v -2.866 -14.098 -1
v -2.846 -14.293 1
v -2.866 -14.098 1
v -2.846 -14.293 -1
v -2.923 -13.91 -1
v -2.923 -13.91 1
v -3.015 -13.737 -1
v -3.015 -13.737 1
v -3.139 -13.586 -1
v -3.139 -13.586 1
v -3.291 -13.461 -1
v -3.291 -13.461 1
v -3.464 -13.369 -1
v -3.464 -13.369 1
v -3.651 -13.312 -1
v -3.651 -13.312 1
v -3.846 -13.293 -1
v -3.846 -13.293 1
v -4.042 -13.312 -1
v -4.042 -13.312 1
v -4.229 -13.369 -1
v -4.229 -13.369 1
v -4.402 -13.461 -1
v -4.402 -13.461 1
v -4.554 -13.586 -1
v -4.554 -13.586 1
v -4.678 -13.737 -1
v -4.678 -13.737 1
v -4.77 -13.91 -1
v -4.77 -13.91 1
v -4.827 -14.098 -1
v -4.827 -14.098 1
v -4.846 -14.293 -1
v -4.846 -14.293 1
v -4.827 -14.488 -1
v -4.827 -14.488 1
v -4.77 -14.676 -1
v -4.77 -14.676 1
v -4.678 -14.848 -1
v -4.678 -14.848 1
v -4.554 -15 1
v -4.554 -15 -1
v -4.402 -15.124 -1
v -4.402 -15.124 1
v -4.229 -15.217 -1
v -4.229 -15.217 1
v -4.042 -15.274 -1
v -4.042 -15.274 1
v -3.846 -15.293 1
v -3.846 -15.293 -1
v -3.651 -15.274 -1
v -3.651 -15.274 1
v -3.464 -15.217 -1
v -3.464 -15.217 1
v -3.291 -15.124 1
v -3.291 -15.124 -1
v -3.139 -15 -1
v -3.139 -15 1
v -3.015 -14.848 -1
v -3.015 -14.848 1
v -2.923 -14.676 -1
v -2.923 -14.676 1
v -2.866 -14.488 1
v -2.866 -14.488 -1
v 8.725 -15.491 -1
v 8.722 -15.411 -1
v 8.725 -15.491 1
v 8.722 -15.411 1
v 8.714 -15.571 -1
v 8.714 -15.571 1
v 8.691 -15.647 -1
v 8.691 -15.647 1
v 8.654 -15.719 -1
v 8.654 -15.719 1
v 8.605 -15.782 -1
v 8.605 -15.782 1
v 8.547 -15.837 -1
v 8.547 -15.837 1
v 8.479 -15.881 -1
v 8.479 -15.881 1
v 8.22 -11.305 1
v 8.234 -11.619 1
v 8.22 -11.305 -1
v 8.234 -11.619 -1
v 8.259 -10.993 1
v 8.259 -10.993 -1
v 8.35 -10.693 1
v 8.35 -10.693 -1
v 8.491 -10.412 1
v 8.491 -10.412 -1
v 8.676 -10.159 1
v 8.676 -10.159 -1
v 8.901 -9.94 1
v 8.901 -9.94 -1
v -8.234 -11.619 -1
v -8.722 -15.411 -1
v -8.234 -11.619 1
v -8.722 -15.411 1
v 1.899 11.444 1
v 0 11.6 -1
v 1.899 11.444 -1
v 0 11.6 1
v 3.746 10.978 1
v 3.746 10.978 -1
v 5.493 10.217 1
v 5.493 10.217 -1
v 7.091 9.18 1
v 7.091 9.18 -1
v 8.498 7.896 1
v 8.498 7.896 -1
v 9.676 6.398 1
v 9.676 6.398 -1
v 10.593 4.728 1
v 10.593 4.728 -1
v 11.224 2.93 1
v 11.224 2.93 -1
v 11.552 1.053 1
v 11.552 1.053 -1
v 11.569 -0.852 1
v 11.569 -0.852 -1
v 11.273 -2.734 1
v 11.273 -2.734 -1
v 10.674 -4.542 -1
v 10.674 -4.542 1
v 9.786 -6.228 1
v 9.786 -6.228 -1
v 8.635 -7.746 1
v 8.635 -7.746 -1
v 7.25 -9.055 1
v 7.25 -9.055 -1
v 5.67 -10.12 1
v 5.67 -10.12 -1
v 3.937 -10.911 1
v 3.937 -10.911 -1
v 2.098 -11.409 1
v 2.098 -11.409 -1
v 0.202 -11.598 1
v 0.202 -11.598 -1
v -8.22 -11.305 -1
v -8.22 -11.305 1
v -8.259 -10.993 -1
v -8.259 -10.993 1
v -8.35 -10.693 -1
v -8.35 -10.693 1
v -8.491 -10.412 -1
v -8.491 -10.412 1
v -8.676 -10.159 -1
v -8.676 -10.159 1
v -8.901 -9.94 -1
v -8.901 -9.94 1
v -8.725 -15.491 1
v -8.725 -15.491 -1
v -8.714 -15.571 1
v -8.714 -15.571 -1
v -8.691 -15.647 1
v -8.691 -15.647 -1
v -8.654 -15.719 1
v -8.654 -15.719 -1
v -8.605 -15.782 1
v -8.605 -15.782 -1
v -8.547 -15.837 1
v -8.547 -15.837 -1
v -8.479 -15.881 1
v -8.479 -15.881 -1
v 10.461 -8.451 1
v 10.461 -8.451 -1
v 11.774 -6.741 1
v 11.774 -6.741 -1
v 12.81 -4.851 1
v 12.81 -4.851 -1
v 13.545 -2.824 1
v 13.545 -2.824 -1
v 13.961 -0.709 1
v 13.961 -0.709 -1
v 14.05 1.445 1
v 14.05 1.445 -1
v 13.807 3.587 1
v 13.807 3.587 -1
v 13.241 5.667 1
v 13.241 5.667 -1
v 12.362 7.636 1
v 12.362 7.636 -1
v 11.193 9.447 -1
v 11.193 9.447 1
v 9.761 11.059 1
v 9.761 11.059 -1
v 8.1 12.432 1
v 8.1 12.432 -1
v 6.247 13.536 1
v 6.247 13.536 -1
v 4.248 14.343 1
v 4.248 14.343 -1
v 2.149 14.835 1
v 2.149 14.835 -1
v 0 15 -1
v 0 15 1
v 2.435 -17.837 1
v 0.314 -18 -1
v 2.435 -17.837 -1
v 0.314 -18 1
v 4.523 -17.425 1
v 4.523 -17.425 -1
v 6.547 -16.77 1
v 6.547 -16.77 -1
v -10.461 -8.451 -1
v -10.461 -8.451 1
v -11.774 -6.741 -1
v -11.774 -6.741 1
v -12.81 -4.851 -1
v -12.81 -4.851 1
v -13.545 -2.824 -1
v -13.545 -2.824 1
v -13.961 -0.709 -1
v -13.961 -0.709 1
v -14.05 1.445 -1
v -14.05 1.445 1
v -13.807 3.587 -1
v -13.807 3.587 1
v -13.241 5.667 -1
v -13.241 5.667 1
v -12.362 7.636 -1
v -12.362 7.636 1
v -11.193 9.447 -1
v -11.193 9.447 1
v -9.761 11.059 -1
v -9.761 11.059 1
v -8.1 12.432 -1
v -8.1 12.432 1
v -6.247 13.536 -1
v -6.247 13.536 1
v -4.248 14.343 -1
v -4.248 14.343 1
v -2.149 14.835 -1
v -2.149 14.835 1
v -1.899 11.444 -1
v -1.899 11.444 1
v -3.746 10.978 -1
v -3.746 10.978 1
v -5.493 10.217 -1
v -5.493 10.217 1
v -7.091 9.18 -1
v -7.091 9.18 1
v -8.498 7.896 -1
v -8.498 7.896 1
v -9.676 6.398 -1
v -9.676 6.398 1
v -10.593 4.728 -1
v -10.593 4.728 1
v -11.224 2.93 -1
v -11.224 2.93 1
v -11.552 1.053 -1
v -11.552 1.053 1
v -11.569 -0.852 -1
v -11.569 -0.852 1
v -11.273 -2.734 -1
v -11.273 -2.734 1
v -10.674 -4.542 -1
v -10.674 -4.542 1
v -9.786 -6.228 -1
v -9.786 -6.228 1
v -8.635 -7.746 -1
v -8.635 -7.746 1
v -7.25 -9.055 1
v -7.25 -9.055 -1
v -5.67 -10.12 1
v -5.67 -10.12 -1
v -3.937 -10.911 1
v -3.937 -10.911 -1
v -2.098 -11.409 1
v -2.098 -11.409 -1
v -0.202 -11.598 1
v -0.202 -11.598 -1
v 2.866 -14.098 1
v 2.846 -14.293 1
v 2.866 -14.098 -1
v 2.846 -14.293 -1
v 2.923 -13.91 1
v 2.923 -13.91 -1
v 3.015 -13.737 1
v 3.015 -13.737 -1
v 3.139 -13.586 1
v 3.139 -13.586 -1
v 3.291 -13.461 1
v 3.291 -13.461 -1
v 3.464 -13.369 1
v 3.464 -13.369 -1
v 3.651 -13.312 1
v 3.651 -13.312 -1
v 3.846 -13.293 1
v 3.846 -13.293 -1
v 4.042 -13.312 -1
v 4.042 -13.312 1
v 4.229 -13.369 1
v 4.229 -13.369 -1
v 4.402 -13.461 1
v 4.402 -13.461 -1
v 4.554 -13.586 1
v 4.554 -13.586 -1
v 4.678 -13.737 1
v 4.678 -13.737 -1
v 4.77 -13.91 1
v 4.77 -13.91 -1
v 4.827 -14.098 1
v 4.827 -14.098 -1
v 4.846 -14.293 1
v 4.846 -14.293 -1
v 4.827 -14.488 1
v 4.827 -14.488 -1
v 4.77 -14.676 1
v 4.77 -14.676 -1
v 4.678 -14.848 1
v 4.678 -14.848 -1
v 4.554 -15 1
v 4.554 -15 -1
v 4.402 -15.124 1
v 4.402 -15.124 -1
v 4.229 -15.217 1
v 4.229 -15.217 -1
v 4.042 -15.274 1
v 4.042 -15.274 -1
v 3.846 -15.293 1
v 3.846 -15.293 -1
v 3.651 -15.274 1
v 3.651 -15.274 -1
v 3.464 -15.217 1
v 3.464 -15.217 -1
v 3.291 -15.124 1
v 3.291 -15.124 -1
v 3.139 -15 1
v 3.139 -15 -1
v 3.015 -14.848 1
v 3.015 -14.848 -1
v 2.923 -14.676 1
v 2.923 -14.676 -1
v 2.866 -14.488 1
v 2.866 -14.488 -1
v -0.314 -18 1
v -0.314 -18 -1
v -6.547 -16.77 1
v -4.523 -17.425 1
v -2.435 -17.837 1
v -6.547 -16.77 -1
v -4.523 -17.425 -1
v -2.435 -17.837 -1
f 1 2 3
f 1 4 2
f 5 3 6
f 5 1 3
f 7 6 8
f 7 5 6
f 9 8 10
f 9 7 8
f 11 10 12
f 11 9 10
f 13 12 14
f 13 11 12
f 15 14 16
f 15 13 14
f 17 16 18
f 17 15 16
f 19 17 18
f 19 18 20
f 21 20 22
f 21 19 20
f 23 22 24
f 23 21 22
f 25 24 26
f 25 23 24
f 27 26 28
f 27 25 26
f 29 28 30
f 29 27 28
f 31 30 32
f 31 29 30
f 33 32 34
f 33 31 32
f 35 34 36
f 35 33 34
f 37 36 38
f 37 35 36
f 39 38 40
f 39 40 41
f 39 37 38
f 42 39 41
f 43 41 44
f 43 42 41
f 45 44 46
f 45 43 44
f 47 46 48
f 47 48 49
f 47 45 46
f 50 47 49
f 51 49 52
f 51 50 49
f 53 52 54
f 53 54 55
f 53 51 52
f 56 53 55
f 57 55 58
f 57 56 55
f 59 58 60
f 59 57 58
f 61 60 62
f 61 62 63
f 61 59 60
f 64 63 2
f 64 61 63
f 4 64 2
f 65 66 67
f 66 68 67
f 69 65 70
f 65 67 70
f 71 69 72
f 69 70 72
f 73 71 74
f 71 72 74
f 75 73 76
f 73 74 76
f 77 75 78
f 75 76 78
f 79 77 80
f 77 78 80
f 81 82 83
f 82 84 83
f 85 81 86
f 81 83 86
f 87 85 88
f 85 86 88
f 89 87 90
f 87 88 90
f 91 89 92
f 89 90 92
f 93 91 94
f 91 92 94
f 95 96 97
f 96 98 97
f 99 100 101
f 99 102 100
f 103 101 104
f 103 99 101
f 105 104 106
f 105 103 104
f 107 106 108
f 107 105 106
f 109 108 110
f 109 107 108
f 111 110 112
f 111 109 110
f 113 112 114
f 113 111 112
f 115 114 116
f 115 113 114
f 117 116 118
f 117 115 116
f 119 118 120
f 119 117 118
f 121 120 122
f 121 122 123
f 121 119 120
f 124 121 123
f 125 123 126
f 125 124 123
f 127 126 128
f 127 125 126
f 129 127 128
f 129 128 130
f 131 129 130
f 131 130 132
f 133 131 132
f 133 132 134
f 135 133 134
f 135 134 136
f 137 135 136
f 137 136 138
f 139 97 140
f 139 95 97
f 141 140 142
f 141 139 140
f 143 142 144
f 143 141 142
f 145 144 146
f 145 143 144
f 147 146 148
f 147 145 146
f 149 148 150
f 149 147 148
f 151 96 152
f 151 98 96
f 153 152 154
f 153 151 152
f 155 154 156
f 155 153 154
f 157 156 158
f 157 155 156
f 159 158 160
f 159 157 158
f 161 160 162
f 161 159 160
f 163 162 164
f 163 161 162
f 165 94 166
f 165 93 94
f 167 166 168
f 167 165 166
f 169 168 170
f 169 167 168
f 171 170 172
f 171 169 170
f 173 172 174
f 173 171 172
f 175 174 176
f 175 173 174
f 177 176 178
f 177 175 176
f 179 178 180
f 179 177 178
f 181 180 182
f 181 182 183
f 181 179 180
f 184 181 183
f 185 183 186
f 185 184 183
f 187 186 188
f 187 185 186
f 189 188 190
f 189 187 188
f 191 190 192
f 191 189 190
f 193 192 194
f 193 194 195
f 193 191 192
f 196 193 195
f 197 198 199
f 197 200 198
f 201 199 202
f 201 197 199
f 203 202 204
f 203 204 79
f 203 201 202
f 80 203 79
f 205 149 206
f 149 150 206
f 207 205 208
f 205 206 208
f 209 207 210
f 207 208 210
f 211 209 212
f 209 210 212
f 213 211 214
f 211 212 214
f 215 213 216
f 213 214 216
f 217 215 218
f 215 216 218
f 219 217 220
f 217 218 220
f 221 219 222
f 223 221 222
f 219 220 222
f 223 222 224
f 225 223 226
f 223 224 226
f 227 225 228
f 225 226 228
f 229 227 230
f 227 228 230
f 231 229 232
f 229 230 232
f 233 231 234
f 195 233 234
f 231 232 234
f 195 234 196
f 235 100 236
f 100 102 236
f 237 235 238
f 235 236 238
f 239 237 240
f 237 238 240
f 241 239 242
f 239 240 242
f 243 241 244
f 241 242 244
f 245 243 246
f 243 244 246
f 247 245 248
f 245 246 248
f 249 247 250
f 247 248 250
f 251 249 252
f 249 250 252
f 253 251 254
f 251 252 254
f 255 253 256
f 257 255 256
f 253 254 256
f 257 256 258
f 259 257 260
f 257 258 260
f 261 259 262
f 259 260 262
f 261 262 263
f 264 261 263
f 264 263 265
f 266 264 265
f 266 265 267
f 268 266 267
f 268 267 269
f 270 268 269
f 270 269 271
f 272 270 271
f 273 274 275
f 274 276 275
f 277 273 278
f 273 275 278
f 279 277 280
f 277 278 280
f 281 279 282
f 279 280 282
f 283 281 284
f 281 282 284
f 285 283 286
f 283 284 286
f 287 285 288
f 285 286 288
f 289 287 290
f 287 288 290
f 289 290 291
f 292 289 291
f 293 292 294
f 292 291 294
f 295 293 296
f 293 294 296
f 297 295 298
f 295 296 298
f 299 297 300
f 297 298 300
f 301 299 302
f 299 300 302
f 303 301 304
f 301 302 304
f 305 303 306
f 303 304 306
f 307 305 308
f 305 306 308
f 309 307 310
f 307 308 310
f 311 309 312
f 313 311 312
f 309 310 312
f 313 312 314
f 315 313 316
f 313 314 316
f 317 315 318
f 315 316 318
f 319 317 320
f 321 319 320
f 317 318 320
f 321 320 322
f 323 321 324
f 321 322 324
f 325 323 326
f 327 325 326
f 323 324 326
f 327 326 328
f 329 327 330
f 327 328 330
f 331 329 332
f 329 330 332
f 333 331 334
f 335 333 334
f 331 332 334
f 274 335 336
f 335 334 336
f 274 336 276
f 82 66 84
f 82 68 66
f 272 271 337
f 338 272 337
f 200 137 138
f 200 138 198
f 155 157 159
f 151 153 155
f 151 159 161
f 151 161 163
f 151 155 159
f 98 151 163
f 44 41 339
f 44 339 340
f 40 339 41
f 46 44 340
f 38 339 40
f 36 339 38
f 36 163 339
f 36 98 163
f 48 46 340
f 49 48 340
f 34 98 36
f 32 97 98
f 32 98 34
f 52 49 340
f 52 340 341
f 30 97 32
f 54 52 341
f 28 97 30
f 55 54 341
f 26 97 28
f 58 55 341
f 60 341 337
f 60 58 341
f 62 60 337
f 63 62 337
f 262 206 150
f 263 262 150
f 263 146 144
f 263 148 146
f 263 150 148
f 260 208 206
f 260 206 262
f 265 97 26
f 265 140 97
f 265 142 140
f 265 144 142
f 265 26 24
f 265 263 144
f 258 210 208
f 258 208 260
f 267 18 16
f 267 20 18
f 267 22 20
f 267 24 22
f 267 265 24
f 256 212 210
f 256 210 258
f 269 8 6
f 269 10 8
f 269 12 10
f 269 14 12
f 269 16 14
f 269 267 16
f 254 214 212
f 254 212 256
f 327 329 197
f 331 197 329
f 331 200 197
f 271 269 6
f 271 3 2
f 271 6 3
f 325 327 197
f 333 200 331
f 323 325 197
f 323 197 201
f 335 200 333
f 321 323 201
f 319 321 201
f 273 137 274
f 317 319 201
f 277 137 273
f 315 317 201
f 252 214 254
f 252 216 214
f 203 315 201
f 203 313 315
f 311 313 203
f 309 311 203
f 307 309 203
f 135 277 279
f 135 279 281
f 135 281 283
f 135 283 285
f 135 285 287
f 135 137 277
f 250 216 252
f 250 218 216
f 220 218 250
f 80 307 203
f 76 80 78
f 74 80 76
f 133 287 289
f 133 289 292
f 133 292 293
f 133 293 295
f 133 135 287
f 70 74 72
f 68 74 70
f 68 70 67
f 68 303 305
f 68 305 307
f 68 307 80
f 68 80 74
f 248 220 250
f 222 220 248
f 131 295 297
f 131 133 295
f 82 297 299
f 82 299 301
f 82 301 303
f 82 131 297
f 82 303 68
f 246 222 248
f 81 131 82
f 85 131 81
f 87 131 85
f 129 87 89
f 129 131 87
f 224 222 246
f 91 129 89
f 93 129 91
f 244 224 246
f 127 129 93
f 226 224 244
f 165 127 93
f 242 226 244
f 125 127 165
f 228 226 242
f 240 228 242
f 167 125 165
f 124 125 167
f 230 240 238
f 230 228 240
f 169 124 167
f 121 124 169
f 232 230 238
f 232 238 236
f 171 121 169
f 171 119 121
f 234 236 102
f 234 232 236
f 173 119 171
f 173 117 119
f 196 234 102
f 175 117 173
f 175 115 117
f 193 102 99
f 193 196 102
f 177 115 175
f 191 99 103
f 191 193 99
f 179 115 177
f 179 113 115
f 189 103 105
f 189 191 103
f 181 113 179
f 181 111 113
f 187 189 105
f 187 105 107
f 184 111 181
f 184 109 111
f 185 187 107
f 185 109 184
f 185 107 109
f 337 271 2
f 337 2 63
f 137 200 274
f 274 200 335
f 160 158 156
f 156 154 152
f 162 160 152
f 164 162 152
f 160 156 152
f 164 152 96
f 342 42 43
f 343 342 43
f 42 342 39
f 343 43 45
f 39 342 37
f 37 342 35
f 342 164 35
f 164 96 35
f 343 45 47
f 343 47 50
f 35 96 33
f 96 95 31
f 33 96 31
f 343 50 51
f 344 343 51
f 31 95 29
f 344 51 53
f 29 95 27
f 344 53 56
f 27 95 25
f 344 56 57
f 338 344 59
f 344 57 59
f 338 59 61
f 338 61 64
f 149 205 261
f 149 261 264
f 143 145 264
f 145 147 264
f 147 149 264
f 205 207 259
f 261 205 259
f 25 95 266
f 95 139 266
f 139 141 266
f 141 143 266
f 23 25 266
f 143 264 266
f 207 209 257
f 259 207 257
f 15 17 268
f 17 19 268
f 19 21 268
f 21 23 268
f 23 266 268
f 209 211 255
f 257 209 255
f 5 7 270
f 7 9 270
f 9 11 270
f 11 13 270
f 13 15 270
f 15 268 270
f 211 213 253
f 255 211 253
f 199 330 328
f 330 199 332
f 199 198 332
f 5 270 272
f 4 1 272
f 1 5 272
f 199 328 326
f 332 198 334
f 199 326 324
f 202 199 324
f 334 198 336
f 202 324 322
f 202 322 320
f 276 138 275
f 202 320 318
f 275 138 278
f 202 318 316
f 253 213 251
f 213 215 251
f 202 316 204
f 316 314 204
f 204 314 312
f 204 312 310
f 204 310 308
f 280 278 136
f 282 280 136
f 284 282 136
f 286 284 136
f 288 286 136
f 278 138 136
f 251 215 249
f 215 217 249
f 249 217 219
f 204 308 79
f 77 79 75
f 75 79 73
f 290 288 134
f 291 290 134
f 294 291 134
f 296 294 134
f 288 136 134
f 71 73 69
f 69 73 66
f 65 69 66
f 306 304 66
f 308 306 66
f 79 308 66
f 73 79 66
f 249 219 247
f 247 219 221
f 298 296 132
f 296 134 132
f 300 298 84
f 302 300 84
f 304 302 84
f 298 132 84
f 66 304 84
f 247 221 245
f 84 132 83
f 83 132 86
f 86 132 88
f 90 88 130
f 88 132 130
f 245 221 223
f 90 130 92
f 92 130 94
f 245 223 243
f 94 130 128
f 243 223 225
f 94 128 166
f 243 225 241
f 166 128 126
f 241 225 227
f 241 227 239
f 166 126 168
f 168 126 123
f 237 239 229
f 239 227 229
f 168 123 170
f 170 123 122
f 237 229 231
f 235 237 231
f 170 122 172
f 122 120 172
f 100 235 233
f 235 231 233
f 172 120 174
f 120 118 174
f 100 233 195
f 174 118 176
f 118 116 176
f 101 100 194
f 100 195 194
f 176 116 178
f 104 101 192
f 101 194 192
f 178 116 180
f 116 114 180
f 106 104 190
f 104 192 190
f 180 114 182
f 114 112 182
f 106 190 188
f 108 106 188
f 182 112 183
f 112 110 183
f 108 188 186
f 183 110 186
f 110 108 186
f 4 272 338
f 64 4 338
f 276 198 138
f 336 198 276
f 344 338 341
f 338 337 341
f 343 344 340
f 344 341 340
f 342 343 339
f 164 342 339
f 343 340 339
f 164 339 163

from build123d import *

# Parameters (mm, degrees)
SKETCH2_R           = 1
BOSS_EXTRUDE1_DEPTH = 1
FILLET1_R           = 1.861618014
FILLET2_R           = 0.465404504


with BuildPart() as part:
    # Sketch2 → Boss-Extrude1 (new body, symmetric)
    with BuildSketch(Plane.XY):
        with BuildLine():
            Line((-8.762233136, -15.726474067), (-8.096527006, -10.551599426))
            ThreePointArc((-8.096527006, -10.551599426), (-13.401846727, 5.188067163), (0, 15))
            Line((0, 15), (0, 11.6))
            ThreePointArc((0, 11.6), (-11.599558308, 0.101227812), (-0.202447915, -11.598233264))
            Line((-0.202447915, -11.598233264), (-0.314191169, -18))
            ThreePointArc((-0.314191169, -18), (-4.678418491, -17.384220331), (-8.762233136, -15.726474067))
        make_face()
        with Locations((-3.84647005, -14.292839124)):
            Circle(SKETCH2_R, mode=Mode.SUBTRACT)
    extrude(amount=BOSS_EXTRUDE1_DEPTH, both=True)

    # Fillet1
    fillet1_edges = [part.edges().sort_by_distance(p)[0] for p in [
        (-8.096527006, -10.551599426, 0),
    ]]
    fillet(fillet1_edges, radius=FILLET1_R)

    # Fillet2
    fillet2_edges = [part.edges().sort_by_distance(p)[0] for p in [
        (-8.762233136, -15.726474067, 0),
    ]]
    fillet(fillet2_edges, radius=FILLET2_R)

    # Mirror1: part across face


with BuildPart() as part_1:
    add(part.part)
    add(part.part.mirror(Plane(origin=(0, 13.3, 0), x_dir=(0, 0, 1), z_dir=(1, 0, 0))))


solid = part_1.part
